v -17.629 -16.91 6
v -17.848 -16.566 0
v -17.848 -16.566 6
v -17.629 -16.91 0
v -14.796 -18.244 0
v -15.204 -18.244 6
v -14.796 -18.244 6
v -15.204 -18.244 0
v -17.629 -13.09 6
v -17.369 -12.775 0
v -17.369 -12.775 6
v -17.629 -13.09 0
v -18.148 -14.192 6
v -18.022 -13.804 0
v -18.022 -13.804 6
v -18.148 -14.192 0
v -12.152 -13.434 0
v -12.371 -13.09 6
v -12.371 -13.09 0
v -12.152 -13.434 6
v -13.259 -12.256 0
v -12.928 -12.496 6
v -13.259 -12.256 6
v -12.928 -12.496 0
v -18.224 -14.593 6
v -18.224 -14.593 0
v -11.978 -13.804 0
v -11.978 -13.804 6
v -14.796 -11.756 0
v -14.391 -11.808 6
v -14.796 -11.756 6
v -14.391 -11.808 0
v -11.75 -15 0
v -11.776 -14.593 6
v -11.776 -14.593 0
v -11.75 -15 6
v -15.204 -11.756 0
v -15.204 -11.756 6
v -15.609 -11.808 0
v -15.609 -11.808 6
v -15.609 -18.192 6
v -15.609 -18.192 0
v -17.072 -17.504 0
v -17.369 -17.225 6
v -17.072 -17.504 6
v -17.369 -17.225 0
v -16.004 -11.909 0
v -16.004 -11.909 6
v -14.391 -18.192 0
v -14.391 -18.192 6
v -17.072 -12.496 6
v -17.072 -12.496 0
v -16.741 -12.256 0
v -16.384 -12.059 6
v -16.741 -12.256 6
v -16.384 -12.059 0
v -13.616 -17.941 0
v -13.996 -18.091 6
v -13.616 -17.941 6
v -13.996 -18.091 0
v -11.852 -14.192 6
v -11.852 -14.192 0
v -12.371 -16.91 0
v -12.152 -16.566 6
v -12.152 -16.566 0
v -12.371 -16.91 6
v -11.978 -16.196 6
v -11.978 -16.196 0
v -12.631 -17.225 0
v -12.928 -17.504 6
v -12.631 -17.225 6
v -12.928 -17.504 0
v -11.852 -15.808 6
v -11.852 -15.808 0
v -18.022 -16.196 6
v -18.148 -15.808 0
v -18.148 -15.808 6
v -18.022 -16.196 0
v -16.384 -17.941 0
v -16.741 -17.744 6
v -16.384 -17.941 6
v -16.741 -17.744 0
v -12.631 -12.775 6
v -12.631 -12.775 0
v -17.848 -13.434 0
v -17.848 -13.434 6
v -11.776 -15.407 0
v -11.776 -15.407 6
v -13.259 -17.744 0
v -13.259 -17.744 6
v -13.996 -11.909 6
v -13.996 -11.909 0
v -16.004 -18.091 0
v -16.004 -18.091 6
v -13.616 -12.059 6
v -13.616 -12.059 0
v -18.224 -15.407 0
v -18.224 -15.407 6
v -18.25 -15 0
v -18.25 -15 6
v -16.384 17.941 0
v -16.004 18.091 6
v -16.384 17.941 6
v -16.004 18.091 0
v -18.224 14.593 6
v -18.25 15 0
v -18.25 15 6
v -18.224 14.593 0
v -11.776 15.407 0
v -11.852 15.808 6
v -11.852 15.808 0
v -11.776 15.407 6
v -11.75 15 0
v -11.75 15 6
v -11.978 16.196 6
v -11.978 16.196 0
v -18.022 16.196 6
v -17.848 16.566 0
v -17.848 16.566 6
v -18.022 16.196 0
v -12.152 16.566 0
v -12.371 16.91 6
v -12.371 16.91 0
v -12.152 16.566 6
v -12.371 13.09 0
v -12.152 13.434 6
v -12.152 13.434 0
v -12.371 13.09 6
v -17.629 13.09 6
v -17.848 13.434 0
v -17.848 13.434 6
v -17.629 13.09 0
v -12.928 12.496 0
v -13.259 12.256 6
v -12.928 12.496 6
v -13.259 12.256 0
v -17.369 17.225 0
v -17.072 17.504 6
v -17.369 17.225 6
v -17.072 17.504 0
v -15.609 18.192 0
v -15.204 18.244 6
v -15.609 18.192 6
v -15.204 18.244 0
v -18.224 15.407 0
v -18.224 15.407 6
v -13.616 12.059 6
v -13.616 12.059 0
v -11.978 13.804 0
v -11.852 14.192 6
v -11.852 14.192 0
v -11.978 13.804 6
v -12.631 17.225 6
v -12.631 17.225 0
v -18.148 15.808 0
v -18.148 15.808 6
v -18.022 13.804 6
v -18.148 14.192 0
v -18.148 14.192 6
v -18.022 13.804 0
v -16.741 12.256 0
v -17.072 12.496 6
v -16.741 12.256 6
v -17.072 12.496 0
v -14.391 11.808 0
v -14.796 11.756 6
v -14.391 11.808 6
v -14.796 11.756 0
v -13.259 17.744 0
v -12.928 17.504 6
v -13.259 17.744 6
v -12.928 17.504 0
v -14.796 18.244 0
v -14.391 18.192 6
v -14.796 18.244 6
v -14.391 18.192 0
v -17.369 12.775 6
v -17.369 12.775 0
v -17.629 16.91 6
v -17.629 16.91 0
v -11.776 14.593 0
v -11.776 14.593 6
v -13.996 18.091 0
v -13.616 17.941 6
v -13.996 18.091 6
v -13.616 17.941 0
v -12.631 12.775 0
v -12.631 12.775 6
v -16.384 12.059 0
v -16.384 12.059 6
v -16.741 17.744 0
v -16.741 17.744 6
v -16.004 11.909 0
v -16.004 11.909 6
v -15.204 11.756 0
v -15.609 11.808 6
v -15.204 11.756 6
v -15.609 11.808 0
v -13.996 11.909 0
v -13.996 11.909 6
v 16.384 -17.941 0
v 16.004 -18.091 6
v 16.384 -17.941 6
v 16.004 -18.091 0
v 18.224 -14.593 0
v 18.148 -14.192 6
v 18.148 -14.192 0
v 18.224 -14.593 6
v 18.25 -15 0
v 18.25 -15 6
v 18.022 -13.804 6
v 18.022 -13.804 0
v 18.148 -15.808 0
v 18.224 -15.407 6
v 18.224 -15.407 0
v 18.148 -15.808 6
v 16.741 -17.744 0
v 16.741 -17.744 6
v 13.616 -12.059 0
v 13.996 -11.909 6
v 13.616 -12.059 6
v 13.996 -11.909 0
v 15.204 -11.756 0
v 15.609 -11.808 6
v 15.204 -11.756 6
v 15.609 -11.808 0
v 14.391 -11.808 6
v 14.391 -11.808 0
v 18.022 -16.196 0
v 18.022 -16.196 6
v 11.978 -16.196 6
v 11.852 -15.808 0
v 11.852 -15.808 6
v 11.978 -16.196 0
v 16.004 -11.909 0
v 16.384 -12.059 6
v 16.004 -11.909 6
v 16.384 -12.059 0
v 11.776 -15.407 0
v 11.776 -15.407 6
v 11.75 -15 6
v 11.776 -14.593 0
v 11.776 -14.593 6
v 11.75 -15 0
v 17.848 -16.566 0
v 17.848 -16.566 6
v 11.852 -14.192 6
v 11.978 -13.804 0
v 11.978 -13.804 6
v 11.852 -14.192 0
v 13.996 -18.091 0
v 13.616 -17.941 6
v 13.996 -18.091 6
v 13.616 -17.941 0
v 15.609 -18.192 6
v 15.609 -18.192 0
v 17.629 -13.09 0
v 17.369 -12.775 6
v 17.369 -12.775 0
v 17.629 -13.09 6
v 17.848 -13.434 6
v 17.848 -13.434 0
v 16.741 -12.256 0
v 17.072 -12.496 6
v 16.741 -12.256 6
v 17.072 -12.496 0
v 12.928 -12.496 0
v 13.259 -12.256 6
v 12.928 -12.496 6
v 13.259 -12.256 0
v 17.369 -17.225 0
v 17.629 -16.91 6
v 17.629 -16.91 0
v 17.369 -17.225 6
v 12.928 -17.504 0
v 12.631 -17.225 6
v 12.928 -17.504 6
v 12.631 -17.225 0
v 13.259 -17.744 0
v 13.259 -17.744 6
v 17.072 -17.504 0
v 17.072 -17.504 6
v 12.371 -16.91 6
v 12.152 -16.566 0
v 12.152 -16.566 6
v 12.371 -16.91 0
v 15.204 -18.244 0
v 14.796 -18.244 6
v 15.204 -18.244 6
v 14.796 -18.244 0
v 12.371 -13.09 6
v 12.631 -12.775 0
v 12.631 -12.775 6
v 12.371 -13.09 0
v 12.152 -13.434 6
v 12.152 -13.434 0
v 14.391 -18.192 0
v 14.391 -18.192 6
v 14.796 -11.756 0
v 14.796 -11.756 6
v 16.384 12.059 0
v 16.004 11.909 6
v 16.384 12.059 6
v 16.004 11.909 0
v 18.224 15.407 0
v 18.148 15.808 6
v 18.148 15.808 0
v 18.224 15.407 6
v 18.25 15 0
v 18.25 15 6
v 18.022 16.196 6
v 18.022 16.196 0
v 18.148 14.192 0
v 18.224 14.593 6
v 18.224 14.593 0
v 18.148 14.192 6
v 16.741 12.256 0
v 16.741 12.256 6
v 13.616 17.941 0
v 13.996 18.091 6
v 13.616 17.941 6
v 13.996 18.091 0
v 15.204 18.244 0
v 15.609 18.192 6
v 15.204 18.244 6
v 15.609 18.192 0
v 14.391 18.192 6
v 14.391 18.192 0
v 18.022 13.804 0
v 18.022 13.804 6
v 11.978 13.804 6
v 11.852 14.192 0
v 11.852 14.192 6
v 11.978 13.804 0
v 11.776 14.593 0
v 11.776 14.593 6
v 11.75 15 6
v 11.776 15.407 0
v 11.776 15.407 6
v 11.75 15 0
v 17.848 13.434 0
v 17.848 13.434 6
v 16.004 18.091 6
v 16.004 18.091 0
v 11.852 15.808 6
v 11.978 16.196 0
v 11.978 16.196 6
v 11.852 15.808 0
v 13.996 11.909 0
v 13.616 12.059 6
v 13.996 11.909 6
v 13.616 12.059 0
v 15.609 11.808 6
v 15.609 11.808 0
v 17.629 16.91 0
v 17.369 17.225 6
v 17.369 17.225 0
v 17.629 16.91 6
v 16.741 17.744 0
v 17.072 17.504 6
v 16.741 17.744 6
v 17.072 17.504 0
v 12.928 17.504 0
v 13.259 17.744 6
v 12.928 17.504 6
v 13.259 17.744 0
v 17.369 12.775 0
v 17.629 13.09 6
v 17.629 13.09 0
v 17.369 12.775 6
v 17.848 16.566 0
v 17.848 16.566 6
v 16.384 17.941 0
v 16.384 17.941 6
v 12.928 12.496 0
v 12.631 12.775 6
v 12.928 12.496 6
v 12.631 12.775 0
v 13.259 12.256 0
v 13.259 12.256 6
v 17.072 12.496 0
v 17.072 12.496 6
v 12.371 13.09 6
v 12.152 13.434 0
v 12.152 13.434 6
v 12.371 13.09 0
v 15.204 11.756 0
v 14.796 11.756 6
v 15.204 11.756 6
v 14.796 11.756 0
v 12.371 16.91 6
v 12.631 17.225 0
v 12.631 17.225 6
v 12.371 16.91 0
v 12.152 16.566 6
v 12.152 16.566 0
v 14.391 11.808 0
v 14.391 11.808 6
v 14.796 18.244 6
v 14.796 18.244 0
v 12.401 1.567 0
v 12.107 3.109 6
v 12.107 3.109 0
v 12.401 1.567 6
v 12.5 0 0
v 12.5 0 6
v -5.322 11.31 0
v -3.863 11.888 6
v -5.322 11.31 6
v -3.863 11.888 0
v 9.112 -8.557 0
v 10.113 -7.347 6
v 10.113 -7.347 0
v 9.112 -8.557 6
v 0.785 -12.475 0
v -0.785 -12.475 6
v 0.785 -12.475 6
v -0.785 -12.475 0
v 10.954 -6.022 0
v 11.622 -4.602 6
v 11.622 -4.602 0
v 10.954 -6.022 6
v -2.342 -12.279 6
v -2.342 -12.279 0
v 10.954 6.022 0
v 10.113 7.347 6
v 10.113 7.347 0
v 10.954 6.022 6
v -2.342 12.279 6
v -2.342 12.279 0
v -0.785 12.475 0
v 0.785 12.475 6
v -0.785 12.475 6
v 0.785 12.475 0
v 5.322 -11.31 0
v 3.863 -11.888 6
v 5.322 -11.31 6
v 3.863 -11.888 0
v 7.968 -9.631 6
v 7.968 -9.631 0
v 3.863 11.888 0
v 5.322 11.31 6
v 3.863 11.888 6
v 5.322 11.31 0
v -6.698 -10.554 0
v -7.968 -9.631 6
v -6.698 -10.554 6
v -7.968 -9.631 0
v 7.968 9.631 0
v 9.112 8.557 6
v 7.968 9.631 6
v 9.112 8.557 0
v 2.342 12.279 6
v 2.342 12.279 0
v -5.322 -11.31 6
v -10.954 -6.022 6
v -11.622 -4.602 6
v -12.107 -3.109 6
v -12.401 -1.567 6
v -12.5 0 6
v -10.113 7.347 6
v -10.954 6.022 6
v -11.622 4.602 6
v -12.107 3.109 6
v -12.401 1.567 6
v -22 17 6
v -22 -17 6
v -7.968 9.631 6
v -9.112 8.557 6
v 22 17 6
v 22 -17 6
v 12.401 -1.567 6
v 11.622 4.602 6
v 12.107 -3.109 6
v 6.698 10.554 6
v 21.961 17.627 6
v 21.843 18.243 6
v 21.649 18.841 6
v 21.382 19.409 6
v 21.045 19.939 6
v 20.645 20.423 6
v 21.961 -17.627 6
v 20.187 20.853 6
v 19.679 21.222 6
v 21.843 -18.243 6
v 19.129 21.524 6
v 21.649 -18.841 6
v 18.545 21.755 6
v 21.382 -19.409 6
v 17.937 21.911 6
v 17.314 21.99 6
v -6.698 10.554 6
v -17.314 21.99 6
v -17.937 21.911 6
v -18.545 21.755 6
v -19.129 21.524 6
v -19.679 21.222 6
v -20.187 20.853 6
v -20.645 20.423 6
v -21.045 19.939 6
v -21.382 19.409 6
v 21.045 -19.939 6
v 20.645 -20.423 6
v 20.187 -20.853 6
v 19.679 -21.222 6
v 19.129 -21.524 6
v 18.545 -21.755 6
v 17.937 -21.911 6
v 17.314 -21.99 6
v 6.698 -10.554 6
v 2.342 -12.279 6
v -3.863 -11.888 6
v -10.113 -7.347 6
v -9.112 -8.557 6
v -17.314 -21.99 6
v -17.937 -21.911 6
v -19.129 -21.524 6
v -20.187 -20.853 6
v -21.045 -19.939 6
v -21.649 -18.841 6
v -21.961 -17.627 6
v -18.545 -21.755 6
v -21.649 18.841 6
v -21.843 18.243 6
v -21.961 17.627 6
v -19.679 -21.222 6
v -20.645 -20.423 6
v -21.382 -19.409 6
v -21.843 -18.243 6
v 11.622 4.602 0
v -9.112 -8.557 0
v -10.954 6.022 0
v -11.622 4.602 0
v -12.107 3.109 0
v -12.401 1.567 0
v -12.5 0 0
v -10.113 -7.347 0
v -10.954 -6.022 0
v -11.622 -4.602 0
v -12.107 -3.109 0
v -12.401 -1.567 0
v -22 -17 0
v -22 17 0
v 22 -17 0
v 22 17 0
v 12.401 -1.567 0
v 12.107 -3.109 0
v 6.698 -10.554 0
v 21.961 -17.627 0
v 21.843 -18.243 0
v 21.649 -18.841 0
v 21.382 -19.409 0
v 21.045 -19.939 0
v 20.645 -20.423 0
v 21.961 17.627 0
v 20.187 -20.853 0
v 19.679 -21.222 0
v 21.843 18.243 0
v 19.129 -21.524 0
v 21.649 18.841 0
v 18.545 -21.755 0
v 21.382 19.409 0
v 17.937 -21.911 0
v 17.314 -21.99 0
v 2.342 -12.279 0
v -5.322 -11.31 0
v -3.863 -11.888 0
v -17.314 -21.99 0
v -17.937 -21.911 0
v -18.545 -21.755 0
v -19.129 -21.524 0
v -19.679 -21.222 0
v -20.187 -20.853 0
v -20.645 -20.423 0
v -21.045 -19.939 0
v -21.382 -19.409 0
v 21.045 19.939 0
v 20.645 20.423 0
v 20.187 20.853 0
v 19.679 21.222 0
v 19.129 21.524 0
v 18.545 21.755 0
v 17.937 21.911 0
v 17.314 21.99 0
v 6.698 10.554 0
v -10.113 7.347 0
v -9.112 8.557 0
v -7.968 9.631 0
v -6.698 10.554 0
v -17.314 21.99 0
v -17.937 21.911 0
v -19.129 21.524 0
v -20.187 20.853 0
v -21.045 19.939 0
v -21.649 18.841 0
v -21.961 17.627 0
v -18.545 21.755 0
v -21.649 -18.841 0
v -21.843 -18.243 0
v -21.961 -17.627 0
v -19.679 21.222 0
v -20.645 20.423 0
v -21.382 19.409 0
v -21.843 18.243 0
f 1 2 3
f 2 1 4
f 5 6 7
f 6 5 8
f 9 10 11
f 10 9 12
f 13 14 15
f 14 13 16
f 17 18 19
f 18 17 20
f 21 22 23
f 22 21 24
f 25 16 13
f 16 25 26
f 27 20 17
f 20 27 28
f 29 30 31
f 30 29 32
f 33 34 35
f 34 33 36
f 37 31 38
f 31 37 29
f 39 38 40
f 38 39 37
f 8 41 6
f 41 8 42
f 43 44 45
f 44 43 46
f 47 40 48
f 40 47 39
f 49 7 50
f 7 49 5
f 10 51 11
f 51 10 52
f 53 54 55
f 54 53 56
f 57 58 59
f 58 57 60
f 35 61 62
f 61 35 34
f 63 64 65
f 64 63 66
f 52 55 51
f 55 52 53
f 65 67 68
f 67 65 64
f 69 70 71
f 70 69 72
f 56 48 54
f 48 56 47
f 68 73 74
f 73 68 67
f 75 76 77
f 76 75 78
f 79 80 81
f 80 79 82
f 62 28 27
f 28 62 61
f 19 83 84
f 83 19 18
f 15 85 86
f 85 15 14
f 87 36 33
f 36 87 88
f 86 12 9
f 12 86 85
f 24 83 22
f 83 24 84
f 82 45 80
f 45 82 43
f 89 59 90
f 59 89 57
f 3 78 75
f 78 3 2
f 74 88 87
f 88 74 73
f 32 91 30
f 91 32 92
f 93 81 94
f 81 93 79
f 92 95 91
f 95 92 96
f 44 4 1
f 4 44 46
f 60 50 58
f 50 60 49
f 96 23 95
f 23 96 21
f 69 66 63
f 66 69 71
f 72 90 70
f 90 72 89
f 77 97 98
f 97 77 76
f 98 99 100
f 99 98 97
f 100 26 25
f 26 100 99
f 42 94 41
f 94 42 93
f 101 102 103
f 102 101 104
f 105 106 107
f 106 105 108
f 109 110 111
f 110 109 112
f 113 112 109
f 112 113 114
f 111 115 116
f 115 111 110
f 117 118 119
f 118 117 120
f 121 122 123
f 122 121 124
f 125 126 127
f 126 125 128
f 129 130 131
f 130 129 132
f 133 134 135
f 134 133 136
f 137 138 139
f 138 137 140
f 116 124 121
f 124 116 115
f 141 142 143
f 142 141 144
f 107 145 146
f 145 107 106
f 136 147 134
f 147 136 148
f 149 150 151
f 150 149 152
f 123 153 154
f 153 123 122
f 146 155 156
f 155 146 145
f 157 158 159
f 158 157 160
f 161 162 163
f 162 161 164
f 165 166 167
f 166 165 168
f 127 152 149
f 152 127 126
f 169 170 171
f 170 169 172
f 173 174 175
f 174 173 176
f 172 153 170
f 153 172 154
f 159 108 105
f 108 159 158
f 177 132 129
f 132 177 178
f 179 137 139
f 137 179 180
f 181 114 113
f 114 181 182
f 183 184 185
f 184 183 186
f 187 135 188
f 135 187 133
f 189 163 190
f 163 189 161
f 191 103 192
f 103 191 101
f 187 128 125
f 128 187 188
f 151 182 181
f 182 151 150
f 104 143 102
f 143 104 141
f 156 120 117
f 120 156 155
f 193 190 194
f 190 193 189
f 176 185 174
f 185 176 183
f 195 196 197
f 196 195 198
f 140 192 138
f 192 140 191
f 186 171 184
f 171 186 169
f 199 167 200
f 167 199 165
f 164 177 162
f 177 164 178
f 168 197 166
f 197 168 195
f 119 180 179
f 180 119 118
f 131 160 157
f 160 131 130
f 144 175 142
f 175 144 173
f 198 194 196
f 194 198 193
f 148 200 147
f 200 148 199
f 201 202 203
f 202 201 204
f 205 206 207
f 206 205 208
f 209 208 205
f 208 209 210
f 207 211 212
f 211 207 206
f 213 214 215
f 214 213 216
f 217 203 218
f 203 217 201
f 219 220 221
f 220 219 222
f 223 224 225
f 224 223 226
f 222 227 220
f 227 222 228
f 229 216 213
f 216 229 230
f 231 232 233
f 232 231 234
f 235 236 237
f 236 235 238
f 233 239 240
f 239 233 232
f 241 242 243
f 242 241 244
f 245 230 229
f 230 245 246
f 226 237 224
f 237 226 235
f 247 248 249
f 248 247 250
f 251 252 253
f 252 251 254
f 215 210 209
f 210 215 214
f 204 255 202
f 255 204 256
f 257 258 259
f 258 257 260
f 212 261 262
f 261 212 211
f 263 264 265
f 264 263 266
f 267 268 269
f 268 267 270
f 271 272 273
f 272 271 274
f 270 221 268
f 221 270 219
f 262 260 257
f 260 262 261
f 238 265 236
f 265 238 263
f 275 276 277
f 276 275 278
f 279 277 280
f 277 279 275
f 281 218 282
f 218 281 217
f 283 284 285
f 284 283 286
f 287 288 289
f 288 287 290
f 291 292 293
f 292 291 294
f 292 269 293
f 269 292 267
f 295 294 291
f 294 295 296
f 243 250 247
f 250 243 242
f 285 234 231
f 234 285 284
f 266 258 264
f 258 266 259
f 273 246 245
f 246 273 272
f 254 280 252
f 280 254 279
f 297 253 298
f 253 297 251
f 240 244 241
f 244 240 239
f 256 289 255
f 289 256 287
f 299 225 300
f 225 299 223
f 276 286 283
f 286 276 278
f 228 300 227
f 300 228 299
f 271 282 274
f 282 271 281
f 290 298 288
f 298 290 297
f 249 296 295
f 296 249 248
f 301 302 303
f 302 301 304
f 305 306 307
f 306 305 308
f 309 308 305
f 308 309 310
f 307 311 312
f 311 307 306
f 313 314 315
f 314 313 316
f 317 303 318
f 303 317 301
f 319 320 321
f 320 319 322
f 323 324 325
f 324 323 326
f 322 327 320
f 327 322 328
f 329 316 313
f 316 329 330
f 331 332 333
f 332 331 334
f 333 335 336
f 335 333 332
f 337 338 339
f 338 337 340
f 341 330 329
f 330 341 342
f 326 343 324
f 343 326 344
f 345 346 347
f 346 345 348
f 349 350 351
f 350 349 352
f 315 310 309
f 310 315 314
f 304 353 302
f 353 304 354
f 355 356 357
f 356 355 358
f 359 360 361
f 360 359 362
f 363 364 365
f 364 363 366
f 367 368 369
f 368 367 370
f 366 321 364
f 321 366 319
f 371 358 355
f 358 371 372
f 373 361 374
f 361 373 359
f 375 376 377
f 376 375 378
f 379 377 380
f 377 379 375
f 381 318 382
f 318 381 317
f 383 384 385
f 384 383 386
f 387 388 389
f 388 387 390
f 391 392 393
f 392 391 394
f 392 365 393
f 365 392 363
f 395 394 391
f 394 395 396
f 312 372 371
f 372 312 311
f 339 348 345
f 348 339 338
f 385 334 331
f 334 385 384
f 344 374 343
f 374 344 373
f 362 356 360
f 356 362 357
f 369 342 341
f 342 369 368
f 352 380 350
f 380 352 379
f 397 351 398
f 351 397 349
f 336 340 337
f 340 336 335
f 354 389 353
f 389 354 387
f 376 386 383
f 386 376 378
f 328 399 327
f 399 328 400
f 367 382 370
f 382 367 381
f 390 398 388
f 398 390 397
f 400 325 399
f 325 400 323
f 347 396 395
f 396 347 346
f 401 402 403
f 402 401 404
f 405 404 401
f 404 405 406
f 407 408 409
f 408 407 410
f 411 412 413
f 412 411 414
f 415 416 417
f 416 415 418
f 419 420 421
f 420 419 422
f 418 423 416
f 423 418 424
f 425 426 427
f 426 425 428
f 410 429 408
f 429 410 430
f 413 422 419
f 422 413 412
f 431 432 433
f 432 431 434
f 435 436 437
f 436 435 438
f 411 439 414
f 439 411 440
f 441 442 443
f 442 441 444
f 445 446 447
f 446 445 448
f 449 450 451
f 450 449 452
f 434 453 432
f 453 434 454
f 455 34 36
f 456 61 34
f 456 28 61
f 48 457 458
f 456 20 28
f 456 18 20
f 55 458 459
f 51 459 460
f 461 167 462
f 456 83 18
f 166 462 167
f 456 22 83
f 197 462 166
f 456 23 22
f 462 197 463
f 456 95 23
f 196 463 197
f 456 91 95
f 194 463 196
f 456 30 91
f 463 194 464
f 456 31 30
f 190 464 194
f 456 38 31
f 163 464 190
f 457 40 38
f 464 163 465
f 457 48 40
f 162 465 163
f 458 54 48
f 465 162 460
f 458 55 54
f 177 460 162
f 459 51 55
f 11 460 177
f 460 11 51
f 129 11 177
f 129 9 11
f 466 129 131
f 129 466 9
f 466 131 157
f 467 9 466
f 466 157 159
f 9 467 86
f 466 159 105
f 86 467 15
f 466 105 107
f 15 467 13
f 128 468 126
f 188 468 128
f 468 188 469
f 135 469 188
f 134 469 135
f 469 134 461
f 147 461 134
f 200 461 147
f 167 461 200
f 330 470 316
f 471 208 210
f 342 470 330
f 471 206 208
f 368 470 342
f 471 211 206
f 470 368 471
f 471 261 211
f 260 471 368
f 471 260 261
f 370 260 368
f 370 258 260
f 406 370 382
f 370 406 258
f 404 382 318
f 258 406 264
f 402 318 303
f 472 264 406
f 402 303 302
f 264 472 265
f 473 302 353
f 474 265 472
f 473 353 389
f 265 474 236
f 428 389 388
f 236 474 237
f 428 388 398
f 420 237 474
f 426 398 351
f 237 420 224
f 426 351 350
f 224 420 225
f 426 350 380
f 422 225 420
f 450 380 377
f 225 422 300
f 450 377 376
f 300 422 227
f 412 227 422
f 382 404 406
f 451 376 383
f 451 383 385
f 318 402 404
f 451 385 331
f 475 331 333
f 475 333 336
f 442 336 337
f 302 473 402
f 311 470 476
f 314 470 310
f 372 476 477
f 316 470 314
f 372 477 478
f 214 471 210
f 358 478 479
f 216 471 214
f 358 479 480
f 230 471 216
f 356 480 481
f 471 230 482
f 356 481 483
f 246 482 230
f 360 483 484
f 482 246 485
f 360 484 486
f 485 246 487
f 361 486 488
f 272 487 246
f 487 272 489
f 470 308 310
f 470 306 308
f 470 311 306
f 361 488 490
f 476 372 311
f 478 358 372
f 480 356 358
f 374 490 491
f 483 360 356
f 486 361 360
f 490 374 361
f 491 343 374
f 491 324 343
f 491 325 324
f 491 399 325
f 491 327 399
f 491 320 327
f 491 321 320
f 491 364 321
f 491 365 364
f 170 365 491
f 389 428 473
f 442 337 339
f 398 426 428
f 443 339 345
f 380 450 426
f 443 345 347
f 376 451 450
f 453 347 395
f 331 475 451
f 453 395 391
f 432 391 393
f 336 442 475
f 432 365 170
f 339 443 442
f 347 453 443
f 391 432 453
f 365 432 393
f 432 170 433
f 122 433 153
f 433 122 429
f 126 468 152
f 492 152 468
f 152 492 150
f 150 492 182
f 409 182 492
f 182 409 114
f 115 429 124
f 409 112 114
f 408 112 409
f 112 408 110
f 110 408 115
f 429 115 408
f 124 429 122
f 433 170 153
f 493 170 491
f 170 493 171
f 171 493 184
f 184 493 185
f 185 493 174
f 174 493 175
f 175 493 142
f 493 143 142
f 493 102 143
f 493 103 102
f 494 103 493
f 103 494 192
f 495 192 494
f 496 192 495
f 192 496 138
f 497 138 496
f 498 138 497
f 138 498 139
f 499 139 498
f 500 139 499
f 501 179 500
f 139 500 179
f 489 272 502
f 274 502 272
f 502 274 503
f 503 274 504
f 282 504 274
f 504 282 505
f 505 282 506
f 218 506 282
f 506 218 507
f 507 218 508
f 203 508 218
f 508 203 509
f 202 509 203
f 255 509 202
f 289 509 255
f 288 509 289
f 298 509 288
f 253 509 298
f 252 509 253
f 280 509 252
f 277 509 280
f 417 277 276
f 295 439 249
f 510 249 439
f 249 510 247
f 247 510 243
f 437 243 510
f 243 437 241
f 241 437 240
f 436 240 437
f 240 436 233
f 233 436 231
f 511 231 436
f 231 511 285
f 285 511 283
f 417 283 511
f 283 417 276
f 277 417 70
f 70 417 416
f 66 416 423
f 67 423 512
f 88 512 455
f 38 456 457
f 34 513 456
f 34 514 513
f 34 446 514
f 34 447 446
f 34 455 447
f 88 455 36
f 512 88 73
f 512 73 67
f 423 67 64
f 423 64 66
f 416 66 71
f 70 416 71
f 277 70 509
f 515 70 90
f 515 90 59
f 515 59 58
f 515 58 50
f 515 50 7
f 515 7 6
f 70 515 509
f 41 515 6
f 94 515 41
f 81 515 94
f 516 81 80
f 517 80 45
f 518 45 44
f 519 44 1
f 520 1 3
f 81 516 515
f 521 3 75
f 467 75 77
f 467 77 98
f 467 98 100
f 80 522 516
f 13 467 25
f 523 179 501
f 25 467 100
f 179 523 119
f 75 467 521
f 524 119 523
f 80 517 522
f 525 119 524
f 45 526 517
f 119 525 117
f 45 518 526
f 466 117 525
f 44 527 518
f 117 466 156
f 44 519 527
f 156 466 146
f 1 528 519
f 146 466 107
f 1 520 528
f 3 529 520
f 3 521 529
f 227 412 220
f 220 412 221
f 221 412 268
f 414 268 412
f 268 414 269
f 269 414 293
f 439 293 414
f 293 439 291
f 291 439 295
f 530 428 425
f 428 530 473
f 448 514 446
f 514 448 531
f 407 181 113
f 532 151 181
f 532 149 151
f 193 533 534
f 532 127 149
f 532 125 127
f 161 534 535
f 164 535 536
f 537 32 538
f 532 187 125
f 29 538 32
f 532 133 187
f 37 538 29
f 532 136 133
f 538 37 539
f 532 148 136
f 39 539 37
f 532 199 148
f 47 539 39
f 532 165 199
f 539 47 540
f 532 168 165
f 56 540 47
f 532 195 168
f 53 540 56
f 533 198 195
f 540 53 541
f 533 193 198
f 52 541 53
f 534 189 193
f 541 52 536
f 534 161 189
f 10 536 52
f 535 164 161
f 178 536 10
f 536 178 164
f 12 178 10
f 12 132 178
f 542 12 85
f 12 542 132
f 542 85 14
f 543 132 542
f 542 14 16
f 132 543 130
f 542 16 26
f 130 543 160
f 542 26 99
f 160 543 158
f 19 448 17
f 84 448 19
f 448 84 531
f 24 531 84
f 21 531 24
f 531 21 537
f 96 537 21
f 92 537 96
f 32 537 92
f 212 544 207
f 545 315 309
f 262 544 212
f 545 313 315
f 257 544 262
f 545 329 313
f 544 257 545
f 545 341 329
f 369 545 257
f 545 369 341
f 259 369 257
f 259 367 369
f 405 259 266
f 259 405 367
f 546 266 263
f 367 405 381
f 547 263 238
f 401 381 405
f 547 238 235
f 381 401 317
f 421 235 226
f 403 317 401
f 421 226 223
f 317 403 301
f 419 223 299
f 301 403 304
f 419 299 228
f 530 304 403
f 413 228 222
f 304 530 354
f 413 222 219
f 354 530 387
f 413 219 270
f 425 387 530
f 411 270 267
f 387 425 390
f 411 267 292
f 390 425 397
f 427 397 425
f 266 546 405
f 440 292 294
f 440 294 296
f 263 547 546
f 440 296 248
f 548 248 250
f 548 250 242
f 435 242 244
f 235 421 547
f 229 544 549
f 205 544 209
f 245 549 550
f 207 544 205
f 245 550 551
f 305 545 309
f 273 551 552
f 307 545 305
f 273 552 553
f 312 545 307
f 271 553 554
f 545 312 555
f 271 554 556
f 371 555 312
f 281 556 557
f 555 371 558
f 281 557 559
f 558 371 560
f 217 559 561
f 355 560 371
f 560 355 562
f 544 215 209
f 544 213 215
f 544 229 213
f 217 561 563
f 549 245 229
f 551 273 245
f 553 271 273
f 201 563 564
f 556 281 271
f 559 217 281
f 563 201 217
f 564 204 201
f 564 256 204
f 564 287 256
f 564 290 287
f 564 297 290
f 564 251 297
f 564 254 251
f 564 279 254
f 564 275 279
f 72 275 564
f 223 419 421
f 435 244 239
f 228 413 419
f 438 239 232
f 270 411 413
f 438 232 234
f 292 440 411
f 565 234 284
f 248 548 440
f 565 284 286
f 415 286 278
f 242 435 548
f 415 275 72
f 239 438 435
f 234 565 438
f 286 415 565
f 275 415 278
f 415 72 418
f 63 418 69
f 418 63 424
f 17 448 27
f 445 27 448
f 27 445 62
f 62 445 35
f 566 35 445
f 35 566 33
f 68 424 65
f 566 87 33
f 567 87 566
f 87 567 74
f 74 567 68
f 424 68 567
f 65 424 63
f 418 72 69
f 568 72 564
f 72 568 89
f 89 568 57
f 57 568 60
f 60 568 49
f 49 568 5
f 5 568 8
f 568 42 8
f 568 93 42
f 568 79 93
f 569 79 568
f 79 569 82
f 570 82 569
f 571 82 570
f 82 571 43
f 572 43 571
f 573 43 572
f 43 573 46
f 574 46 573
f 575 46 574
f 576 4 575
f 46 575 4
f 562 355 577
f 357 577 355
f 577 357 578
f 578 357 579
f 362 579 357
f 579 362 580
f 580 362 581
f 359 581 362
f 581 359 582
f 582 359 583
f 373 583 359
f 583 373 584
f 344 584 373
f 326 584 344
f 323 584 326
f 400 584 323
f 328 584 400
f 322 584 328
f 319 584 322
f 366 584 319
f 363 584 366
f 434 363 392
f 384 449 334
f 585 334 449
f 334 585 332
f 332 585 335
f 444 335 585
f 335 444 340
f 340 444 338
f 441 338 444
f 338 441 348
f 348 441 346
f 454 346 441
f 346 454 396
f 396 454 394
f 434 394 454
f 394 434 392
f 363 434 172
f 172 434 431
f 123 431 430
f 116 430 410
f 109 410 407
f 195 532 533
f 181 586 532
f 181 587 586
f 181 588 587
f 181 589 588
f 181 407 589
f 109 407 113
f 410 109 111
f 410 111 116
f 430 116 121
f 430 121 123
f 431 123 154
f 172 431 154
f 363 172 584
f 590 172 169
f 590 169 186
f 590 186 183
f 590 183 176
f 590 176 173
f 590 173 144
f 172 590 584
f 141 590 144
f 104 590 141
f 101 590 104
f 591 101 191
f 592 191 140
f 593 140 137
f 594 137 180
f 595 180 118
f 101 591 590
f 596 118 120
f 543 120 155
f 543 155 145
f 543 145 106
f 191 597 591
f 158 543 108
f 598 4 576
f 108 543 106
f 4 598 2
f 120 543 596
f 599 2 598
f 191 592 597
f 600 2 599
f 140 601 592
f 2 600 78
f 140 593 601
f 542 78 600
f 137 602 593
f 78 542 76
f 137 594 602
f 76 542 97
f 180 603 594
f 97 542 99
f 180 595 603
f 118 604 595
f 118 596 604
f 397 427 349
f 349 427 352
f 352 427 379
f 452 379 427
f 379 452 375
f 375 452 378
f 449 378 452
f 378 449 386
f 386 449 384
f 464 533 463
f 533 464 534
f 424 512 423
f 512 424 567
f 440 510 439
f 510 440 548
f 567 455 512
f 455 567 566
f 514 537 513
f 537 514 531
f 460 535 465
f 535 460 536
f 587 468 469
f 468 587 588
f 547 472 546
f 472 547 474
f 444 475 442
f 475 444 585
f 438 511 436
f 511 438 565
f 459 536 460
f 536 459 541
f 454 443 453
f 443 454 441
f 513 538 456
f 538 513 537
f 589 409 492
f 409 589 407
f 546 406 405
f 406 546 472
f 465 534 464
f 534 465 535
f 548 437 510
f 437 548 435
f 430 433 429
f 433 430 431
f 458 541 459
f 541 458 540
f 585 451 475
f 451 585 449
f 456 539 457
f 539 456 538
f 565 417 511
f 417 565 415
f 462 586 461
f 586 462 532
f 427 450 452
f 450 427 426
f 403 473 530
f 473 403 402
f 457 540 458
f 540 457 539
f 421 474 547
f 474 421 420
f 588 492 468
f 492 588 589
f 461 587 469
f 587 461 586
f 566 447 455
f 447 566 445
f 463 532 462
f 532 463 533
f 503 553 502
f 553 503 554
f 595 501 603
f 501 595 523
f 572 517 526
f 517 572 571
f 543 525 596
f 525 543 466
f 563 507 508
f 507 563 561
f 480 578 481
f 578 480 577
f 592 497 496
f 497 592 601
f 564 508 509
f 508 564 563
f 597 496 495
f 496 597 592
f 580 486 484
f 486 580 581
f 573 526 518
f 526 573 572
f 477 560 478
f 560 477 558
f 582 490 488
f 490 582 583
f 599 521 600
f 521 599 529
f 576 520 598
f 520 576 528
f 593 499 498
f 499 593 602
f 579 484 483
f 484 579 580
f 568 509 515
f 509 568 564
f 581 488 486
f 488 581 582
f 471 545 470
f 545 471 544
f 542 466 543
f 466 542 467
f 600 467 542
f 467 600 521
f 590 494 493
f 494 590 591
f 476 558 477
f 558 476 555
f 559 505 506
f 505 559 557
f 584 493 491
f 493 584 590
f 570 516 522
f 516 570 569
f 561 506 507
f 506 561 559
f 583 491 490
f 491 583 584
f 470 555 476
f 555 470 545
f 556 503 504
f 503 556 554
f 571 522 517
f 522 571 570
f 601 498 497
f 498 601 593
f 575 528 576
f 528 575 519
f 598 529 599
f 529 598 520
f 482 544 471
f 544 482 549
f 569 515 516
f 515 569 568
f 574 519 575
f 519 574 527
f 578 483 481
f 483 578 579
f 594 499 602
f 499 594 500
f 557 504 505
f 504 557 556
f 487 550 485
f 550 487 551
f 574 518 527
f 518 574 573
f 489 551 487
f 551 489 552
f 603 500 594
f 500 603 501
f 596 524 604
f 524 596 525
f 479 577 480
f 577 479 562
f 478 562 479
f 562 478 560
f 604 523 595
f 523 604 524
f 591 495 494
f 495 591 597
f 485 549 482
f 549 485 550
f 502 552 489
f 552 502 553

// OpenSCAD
$fn = 50;


difference() {
	union() {
		hull() {
			translate(v = [-17.0000000000, 17.0000000000, 0]) {
				cylinder(h = 6, r = 5);
			}
			translate(v = [17.0000000000, 17.0000000000, 0]) {
				cylinder(h = 6, r = 5);
			}
			translate(v = [-17.0000000000, -17.0000000000, 0]) {
				cylinder(h = 6, r = 5);
			}
			translate(v = [17.0000000000, -17.0000000000, 0]) {
				cylinder(h = 6, r = 5);
			}
		}
	}
	union() {
		#translate(v = [-15.0000000000, -15.0000000000, -100.0000000000]) {
			cylinder(h = 200, r = 3.2500000000);
		}
		#translate(v = [-15.0000000000, 15.0000000000, -100.0000000000]) {
			cylinder(h = 200, r = 3.2500000000);
		}
		#translate(v = [15.0000000000, -15.0000000000, -100.0000000000]) {
			cylinder(h = 200, r = 3.2500000000);
		}
		#translate(v = [15.0000000000, 15.0000000000, -100.0000000000]) {
			cylinder(h = 200, r = 3.2500000000);
		}
		#cylinder(h = 6, r = 12.5000000000);
	}
}
